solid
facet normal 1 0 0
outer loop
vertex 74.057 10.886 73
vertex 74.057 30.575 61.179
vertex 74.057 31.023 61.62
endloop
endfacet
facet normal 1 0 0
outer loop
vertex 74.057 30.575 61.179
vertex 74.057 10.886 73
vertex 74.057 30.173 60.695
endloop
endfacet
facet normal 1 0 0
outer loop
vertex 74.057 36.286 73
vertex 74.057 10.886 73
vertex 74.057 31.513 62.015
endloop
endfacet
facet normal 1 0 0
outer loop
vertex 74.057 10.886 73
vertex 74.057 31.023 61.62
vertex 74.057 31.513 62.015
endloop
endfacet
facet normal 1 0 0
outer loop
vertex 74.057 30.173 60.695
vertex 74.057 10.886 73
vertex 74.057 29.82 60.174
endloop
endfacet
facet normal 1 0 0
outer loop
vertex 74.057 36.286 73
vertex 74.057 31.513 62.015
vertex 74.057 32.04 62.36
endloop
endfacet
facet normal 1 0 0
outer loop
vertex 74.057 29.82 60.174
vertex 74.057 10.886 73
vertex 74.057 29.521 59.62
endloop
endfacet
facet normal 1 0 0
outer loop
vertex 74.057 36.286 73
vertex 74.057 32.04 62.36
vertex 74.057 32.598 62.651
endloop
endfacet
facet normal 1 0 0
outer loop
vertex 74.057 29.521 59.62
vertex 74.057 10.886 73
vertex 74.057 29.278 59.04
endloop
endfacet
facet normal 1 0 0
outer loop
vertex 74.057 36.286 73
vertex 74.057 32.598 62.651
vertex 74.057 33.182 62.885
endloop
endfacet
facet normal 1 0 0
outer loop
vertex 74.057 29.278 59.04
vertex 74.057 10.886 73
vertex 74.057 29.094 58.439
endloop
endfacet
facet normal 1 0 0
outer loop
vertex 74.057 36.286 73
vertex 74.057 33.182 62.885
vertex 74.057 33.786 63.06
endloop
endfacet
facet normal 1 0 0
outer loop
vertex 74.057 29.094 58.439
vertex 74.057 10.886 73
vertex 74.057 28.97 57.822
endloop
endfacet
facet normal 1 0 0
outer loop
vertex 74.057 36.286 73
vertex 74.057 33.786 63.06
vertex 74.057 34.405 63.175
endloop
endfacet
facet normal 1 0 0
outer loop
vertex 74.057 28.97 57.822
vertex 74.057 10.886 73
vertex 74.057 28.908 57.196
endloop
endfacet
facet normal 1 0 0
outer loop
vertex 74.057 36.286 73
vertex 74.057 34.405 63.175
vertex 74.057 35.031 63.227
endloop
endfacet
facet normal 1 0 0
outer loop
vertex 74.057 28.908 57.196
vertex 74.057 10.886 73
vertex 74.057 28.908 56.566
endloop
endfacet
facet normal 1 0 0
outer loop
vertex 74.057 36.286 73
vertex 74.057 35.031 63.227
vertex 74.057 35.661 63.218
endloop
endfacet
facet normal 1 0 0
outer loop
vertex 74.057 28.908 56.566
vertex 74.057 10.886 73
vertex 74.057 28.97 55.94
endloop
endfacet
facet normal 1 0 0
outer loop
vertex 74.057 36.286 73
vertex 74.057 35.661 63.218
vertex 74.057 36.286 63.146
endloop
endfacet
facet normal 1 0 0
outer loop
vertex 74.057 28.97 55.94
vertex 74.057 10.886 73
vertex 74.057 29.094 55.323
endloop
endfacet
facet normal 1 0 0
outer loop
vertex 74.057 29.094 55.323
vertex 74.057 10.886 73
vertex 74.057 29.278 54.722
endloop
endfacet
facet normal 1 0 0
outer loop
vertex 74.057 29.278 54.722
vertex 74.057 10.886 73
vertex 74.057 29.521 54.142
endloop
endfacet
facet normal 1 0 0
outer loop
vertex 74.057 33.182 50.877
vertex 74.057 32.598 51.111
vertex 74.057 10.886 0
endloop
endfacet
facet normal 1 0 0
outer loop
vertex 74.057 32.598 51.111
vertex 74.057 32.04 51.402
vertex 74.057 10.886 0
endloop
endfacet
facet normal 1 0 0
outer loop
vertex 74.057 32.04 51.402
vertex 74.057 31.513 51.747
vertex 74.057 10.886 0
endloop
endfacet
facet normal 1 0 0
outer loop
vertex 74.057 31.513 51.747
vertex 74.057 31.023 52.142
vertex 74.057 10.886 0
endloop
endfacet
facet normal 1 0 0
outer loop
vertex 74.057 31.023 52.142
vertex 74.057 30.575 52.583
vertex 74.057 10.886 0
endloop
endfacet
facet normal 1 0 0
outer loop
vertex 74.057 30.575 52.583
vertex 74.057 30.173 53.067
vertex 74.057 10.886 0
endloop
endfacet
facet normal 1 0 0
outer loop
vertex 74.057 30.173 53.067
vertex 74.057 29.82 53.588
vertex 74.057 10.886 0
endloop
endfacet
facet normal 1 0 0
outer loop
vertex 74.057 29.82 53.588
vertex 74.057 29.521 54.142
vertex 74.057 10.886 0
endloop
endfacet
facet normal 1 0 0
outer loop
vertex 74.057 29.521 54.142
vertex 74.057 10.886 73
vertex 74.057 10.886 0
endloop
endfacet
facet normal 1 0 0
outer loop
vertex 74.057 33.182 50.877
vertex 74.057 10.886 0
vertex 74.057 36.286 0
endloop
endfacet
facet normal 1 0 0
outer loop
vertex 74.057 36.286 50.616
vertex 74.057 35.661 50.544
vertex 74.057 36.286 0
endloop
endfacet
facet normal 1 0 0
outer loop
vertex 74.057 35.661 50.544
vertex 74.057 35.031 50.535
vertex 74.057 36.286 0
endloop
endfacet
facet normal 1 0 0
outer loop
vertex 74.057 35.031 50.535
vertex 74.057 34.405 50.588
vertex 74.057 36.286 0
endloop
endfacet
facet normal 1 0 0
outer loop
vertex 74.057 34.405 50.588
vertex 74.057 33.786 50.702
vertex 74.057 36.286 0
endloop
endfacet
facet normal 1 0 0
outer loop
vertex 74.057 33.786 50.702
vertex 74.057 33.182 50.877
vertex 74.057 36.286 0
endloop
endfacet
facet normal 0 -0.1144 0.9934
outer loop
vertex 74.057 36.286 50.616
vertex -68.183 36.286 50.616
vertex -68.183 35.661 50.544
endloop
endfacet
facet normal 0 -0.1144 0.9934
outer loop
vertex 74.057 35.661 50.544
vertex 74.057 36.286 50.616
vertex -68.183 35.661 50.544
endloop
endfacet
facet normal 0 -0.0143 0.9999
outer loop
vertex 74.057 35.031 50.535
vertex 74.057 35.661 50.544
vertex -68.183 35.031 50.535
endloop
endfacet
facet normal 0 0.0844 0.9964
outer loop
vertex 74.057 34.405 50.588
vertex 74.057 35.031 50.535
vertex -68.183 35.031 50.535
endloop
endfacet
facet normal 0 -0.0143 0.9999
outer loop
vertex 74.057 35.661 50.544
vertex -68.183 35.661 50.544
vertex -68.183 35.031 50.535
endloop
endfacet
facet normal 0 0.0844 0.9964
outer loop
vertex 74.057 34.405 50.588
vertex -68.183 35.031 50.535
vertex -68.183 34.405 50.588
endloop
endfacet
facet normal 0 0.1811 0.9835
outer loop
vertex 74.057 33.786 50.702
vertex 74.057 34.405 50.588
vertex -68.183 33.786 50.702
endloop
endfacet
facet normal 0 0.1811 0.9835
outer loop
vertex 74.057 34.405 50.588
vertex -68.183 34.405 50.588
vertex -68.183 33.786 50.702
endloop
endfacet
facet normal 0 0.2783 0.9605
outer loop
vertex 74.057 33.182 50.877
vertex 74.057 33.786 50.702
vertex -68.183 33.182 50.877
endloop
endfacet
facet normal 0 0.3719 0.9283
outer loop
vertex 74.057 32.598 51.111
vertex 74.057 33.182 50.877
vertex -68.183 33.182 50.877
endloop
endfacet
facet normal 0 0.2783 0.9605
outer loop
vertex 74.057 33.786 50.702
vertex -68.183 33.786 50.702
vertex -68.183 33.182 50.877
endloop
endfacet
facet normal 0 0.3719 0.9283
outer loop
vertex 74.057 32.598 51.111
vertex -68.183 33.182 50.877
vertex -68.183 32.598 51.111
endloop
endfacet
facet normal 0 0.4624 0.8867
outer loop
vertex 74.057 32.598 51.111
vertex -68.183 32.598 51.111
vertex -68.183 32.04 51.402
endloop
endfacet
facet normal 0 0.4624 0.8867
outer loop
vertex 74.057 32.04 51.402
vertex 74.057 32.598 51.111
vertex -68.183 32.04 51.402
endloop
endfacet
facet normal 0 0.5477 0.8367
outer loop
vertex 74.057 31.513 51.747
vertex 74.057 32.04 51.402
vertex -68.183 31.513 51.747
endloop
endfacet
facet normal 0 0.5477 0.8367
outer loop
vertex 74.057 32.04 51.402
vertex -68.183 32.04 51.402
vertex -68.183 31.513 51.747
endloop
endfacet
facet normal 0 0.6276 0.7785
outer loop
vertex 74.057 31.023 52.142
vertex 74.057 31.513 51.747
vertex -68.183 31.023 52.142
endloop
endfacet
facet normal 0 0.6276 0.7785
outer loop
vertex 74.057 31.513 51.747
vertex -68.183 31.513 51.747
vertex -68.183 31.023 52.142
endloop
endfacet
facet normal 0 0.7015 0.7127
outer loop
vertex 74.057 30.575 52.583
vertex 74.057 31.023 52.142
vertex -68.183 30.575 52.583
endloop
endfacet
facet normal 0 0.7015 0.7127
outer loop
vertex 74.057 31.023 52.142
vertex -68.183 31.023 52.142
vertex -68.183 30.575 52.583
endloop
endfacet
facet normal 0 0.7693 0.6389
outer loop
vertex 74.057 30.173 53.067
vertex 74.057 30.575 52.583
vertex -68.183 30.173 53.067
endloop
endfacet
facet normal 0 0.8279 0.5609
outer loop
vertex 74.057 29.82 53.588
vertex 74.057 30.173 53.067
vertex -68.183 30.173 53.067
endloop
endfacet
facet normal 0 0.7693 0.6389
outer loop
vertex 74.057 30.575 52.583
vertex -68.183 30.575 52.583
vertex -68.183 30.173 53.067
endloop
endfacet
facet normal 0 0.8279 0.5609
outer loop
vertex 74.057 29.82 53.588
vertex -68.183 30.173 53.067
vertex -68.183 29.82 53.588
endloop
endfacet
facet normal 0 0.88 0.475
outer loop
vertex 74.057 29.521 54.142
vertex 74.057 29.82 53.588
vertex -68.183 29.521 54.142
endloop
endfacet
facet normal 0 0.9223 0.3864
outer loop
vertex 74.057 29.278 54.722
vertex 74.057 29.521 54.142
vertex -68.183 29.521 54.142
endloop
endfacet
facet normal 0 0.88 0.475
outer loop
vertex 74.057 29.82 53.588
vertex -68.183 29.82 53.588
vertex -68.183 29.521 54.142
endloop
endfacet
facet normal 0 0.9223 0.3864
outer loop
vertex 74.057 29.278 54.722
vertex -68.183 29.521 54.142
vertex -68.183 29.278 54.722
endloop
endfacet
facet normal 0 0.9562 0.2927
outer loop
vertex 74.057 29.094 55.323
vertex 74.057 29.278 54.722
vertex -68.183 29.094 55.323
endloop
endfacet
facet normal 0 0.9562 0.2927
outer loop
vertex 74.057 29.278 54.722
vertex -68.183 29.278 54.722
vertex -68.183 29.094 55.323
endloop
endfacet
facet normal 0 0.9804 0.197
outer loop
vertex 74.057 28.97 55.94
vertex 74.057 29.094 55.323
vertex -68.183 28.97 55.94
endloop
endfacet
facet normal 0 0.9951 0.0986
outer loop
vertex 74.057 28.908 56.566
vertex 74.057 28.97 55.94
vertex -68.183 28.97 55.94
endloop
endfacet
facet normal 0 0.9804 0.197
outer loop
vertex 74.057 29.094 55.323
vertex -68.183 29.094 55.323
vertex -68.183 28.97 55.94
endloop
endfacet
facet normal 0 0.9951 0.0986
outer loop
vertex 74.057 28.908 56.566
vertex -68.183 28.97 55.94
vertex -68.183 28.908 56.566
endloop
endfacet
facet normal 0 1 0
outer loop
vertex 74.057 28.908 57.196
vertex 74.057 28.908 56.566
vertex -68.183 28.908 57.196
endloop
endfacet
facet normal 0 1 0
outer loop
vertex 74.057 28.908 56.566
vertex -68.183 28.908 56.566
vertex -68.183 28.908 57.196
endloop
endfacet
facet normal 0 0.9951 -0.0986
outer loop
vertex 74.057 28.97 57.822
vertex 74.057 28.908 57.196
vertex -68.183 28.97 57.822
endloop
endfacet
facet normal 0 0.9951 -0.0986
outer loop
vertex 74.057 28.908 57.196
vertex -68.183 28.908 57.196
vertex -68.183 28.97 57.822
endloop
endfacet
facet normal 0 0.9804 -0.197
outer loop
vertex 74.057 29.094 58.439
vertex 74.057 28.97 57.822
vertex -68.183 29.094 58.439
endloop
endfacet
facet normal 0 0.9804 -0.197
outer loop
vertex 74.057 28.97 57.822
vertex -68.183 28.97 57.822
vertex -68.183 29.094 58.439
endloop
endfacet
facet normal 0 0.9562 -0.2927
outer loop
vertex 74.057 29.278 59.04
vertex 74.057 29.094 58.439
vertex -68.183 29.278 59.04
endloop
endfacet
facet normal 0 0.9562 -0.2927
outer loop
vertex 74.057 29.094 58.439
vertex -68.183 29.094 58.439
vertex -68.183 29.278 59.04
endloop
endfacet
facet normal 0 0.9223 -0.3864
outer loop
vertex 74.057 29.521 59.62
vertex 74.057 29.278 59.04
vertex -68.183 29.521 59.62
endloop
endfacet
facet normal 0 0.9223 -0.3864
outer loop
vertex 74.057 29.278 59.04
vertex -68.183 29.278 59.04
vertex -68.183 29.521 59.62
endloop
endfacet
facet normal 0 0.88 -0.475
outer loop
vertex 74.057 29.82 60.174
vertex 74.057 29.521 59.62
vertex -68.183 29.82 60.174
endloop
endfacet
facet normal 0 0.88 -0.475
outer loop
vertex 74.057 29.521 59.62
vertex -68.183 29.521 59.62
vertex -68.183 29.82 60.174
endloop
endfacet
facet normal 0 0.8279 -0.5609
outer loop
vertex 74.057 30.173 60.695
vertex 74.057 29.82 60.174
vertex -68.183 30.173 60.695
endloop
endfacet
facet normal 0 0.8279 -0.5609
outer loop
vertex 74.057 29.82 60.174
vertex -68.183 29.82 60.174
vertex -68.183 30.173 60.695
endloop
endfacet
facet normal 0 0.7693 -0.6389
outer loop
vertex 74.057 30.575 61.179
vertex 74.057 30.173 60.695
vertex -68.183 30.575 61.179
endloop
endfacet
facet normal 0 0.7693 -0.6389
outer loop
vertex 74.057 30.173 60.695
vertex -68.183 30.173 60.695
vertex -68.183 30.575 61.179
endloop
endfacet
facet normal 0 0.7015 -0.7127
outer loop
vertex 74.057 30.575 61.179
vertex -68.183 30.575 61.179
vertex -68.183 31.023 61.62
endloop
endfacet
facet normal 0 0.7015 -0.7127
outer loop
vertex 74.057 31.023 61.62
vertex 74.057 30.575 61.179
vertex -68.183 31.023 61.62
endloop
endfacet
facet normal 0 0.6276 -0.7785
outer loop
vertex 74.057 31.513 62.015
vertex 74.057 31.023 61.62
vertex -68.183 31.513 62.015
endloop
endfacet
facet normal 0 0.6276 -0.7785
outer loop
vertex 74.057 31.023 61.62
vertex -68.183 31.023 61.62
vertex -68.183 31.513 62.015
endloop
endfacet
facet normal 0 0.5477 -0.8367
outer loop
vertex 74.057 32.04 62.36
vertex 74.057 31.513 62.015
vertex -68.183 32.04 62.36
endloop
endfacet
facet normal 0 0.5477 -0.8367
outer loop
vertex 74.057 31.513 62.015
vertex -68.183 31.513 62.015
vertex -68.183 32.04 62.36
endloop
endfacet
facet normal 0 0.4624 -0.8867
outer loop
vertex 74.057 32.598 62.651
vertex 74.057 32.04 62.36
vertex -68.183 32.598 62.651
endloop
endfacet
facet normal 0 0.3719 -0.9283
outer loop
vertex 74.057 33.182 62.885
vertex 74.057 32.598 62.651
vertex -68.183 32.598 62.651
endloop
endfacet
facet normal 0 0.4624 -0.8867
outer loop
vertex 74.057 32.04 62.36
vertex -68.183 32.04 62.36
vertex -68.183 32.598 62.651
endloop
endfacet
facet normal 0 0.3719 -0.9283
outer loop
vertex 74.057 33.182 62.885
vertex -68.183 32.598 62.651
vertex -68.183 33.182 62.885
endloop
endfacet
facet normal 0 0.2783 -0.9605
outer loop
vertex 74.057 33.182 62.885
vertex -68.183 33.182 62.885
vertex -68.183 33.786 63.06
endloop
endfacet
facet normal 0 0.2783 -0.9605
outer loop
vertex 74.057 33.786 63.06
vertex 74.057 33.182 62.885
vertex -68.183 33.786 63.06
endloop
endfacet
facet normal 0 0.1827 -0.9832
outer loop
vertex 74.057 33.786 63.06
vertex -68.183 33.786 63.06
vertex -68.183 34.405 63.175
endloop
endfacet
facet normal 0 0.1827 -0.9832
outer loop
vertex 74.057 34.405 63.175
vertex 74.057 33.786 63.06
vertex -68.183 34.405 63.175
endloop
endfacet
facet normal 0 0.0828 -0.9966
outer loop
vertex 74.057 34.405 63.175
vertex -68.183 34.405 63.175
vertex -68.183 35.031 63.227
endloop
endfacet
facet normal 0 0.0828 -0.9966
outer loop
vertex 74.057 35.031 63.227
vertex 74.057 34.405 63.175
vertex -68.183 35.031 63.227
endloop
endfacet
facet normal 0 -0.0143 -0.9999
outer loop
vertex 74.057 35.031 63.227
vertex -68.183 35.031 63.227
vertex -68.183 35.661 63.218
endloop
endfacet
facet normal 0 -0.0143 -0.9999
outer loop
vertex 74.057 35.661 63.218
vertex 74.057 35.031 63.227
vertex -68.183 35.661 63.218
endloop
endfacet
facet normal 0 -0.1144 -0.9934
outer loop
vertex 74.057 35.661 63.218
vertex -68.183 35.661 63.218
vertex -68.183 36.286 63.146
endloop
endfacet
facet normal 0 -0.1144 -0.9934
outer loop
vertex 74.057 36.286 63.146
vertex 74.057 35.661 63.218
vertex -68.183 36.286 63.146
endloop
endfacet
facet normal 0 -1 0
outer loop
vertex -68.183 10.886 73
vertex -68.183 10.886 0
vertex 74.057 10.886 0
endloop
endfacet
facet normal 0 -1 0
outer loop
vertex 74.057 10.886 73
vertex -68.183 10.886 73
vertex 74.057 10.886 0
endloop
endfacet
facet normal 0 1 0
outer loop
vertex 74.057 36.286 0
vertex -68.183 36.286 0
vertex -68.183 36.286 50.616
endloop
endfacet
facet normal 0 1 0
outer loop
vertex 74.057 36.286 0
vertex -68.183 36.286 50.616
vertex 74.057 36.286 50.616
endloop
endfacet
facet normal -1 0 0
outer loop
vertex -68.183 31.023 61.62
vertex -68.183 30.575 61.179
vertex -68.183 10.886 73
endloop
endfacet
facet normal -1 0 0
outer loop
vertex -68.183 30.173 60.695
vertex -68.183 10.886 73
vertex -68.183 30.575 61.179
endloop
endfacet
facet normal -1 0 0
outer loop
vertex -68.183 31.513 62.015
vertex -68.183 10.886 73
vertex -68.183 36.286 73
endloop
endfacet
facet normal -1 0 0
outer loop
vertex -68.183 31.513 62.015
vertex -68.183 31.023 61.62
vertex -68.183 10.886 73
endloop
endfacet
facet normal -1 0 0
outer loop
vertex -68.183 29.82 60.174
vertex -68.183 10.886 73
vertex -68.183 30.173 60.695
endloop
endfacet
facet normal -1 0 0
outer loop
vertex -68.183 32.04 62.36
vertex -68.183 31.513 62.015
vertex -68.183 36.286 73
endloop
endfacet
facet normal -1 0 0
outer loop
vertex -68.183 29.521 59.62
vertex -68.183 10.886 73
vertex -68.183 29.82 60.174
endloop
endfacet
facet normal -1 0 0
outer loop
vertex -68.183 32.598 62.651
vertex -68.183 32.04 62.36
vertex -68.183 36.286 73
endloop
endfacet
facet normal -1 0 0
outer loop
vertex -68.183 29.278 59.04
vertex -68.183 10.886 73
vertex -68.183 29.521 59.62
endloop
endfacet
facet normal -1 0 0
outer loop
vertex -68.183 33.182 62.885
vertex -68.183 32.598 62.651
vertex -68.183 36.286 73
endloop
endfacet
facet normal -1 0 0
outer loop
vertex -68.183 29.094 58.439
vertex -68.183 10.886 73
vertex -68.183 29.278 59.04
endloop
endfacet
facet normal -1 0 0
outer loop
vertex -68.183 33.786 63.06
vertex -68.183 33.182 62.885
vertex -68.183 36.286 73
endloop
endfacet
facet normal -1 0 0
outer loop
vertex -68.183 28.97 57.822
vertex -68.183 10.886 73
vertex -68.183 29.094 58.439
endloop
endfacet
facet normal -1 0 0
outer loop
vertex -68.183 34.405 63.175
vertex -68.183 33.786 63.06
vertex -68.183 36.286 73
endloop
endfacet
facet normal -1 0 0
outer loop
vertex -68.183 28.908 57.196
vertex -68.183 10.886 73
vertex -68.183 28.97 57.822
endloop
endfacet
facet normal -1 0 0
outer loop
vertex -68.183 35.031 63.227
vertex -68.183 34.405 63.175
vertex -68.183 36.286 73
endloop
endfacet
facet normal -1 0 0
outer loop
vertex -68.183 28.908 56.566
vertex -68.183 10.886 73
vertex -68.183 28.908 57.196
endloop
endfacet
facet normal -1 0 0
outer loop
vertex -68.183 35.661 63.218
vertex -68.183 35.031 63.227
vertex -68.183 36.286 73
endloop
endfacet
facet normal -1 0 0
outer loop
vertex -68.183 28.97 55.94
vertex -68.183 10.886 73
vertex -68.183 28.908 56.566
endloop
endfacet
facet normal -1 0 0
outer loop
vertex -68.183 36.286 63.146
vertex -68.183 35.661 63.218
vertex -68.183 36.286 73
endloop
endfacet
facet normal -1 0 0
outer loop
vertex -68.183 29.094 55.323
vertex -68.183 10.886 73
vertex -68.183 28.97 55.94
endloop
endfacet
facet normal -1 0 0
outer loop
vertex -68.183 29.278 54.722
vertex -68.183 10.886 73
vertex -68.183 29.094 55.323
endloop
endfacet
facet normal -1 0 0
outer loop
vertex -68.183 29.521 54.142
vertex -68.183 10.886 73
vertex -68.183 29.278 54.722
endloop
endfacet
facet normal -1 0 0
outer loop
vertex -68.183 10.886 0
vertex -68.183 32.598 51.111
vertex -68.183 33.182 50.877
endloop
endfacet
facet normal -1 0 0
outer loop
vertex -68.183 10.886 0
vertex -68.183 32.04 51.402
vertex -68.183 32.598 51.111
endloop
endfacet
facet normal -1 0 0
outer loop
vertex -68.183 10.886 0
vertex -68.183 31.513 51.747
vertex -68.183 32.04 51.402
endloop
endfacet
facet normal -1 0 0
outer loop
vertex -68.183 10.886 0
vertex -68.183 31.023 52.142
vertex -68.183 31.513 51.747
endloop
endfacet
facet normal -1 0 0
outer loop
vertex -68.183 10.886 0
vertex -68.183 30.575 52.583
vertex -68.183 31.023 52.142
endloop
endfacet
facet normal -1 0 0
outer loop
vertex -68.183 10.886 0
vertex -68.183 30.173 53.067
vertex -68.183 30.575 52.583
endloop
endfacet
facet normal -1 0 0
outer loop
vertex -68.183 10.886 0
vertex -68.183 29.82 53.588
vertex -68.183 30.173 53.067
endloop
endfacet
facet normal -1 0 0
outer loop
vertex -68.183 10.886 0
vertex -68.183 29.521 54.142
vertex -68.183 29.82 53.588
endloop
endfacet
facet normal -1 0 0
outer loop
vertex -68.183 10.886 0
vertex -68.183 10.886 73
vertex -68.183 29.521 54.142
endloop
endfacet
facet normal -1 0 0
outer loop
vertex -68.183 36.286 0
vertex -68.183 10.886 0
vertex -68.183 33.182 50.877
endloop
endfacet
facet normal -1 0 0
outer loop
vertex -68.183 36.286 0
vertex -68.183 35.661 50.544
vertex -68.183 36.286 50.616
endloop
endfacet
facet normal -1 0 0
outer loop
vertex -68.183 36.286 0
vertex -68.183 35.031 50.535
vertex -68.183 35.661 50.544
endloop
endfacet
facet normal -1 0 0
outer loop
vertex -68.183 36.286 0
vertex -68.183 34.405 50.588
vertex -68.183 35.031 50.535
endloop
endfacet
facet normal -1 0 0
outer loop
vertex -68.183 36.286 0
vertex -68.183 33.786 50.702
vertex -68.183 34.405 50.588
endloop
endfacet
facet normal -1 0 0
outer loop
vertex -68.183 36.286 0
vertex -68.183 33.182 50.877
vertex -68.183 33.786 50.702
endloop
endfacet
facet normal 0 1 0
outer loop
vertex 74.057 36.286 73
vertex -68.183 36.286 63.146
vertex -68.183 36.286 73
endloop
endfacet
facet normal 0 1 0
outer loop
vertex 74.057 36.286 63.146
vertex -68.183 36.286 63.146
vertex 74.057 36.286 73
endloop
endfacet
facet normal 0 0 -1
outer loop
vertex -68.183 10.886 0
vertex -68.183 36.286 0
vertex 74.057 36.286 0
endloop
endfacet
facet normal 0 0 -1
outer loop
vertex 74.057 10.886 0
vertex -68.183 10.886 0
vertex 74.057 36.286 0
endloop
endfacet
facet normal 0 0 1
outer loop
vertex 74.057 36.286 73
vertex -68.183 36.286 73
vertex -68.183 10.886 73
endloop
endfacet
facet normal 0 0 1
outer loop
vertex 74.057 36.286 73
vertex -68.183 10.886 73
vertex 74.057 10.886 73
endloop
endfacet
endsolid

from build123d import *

# Parameters (mm, degrees)
F0_W     = 142.24
F0_H     = 38.1
F1_DEPTH = 73
F3_DEPTH = 142.24
F4_DEPTH = 12.7


with BuildPart() as f1:
    # F0 (on Top) → F1 (new body)
    with BuildSketch(Plane.XY):
        with Locations((2.9369369149, 17.2356535431)):
            Rectangle(F0_W, F0_H)
    extrude(amount=F1_DEPTH)

    # F2 (on face) → F3 (cut)
    with BuildSketch(Plane(origin=(-68.1830630851, 0, 0), x_dir=(0, -1, 0), z_dir=(-1, 0, 0))):
        with BuildLine():
            Line((-36.2856535431, 63.1459391326), (-36.2856535431, 50.6160780787))
            ThreePointArc((-36.2856535431, 50.6160780787), (-28.8997261841, 56.8810086057), (-36.2856535431, 63.1459391326))
        make_face()
    extrude(amount=-F3_DEPTH, mode=Mode.SUBTRACT)

    # F4 (cut): a face of the model
    f4_faces = [f1.faces().sort_by_distance(p)[0] for p in [
        (2.9369369149, -1.8143464569, 36.5),
    ]]
    extrude(f4_faces, amount=-F4_DEPTH, mode=Mode.SUBTRACT)


solid = f1.part
